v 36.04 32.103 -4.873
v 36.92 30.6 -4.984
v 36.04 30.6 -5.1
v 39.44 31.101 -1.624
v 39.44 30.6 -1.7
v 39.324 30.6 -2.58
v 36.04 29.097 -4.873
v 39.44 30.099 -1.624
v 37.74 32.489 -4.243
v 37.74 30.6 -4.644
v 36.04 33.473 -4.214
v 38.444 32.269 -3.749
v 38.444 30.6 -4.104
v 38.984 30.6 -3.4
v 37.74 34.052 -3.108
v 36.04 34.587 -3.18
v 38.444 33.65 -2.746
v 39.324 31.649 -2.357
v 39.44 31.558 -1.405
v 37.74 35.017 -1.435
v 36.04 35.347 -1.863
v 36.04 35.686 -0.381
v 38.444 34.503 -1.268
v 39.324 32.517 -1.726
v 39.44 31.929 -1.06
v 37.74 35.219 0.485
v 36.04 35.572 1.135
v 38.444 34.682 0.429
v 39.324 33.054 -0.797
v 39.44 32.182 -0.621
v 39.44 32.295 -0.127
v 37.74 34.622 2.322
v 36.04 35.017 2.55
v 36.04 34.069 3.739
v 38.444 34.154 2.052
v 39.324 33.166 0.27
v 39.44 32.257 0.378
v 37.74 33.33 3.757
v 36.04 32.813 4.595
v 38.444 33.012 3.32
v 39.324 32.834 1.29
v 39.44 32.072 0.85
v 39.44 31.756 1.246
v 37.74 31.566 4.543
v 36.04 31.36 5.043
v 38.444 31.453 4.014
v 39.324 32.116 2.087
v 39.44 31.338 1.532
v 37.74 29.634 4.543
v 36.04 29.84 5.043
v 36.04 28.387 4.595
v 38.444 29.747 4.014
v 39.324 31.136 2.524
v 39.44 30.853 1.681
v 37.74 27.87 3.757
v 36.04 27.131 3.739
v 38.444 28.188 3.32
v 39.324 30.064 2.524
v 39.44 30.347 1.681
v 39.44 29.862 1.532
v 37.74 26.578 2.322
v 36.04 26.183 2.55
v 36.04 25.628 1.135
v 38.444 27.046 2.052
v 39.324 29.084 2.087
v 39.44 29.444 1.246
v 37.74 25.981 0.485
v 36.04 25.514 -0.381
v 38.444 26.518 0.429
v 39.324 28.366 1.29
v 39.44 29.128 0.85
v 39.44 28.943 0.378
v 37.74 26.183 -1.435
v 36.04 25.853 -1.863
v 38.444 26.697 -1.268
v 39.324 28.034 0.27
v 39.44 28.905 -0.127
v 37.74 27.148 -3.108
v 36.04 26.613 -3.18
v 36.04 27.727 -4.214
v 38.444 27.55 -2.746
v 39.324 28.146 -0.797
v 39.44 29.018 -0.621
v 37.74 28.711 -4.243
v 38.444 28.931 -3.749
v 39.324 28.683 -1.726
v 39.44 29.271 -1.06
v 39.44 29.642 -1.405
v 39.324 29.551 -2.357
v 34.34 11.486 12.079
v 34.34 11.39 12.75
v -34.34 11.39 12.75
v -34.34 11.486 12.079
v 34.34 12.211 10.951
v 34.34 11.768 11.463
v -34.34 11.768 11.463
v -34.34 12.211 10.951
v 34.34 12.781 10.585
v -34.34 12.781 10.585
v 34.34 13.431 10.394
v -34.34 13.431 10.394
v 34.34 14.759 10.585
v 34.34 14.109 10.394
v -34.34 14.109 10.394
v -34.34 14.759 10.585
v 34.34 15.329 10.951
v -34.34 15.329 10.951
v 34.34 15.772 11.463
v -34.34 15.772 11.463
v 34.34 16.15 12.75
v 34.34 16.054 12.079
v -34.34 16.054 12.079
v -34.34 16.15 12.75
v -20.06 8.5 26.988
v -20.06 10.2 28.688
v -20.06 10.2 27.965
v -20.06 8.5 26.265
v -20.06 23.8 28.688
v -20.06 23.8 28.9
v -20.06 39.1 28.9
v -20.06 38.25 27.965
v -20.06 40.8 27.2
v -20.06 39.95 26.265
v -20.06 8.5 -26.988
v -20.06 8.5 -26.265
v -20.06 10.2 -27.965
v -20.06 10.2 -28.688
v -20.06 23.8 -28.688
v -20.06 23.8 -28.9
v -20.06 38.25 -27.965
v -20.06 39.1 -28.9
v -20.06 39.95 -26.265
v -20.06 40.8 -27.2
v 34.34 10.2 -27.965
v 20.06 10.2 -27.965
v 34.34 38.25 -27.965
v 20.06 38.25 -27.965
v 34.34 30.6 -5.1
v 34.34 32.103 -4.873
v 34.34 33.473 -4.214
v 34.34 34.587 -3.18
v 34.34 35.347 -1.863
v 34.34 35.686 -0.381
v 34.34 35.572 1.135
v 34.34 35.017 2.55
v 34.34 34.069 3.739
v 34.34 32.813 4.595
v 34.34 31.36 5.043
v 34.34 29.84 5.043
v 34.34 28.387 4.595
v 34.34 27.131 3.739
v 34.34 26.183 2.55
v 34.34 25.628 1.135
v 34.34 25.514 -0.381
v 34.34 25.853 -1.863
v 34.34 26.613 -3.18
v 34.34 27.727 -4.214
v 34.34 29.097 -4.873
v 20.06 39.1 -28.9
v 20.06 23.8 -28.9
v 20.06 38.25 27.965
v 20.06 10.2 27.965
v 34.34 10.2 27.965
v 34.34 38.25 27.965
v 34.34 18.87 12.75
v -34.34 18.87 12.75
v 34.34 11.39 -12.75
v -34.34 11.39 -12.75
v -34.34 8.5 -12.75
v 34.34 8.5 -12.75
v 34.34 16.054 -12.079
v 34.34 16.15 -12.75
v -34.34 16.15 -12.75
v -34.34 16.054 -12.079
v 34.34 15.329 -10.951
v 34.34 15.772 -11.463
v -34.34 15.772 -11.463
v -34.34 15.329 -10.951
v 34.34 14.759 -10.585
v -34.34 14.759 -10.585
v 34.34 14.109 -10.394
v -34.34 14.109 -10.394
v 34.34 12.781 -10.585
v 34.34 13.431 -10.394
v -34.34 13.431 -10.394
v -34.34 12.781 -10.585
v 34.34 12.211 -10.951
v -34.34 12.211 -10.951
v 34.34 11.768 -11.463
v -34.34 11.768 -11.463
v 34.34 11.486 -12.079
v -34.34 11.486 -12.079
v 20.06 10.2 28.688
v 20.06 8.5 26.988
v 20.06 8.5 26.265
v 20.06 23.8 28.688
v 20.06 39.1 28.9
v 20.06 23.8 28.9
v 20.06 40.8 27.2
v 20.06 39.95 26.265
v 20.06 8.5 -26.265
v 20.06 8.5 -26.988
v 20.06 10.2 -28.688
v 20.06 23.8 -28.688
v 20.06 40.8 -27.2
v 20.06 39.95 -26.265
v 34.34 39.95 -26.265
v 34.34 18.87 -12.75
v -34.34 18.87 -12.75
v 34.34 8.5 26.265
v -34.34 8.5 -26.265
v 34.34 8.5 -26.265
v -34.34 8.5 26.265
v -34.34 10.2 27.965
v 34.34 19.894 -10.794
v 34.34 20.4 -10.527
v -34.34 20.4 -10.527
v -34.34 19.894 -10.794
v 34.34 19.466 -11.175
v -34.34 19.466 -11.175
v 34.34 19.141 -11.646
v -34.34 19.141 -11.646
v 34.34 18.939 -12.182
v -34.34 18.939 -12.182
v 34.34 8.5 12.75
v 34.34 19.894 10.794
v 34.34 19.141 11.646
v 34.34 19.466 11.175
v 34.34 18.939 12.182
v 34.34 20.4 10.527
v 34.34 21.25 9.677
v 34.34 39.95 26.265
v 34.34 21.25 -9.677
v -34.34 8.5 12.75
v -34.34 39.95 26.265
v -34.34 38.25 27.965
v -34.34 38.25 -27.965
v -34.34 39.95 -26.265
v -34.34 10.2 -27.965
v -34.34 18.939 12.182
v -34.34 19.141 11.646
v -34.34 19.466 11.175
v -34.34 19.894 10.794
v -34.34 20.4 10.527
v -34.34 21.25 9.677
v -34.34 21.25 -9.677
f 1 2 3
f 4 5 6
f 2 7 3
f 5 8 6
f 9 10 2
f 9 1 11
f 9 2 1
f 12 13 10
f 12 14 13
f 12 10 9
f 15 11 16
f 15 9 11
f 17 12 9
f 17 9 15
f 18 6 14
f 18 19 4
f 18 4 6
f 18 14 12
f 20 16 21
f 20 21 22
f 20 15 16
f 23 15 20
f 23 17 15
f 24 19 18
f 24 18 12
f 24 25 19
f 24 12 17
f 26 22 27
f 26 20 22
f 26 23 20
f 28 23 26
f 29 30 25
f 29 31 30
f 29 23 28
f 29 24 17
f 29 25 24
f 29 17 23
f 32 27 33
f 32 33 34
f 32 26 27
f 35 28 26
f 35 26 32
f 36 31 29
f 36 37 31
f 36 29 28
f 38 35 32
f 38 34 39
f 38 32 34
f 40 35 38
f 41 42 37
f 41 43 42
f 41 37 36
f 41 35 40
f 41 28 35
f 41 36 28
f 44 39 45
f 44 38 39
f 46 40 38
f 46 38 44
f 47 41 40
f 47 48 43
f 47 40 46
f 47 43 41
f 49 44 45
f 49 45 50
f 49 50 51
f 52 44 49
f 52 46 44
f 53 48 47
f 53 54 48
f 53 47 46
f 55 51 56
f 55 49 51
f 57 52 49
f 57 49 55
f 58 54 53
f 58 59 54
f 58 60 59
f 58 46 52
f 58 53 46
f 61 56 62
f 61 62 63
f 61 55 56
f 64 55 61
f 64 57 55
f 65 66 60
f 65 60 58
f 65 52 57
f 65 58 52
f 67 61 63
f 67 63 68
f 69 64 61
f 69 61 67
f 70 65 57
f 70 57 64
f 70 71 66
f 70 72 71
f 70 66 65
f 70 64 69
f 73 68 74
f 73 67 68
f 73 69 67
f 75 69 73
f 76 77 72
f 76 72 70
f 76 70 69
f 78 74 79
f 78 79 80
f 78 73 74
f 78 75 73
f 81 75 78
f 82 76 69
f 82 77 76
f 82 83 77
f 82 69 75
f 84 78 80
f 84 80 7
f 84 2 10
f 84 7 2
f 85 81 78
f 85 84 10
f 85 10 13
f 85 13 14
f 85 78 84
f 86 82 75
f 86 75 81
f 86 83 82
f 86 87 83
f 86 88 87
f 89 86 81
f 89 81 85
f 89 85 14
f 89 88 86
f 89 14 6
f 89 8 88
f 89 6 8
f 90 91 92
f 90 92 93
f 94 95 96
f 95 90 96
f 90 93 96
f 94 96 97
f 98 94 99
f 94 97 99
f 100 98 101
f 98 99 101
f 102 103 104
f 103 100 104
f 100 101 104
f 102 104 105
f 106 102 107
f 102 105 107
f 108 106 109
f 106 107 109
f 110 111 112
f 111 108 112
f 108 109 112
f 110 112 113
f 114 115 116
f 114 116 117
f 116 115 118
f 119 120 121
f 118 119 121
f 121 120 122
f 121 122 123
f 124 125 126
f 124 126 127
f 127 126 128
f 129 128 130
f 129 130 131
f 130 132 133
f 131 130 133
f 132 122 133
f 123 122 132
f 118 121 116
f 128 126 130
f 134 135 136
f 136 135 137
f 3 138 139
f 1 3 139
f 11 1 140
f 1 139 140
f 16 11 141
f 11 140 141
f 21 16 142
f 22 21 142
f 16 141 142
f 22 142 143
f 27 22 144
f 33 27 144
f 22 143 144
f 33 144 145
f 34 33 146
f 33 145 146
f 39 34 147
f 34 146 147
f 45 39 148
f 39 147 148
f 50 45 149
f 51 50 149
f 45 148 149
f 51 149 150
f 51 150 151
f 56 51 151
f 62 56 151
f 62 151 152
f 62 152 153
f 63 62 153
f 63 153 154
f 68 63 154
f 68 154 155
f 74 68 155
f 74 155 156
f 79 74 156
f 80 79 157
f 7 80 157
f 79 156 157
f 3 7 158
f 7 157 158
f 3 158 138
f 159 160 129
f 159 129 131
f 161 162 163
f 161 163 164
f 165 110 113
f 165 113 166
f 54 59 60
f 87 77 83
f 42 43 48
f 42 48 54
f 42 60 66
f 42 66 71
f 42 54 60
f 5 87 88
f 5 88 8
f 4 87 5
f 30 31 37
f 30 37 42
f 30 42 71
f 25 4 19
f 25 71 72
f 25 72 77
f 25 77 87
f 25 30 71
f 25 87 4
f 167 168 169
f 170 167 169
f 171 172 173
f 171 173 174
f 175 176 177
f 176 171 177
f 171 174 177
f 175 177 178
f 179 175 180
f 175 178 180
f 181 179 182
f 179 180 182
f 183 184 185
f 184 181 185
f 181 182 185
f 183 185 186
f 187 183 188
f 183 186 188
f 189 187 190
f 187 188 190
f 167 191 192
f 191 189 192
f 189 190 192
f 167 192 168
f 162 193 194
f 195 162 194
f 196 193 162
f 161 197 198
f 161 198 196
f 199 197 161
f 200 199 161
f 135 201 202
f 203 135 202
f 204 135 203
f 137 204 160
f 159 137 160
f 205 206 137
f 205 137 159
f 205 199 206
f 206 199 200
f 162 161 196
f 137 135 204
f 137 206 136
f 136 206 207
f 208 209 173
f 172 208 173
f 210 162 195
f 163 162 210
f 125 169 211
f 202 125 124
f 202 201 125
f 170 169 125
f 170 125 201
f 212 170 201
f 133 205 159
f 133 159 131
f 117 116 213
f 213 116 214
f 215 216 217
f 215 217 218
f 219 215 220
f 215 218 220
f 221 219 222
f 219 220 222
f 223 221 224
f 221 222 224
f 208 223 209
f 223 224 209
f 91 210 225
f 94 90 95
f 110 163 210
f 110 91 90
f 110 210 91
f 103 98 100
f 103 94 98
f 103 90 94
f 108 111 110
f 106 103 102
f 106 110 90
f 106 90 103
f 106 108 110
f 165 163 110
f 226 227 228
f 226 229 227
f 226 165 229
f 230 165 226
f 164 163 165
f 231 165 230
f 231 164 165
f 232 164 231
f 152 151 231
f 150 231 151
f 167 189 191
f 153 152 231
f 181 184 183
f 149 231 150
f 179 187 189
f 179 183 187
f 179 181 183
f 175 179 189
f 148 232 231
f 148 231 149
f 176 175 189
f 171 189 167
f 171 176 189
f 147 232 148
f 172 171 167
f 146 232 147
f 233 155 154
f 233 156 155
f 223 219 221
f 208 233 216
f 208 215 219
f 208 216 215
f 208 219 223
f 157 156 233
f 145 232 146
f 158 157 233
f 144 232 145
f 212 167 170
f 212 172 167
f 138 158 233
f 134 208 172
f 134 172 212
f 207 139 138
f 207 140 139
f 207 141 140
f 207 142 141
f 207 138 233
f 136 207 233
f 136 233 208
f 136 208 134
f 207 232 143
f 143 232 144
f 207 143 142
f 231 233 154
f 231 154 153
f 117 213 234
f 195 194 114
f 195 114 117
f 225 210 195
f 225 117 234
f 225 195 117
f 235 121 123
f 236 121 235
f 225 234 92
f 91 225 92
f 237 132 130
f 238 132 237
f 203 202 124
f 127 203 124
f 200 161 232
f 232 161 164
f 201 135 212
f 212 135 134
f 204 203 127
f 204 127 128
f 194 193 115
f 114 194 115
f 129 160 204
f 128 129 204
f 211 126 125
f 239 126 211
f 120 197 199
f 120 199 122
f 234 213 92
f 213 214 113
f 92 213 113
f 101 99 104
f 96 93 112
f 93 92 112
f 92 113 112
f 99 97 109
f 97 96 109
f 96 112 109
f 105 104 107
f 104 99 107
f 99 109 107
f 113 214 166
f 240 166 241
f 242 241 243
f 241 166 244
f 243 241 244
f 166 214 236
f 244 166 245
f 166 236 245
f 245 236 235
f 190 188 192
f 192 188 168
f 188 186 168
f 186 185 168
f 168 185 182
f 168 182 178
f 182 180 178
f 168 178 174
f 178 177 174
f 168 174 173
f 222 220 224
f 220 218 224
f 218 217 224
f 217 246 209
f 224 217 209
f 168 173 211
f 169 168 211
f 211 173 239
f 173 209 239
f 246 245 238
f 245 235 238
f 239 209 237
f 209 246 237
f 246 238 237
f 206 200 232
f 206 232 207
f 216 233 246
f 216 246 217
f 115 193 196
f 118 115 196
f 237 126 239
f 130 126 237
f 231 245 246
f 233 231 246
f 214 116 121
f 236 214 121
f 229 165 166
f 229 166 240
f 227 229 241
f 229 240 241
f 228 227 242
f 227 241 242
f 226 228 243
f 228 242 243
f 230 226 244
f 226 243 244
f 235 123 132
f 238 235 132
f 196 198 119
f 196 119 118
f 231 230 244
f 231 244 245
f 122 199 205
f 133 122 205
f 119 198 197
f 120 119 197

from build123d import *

# Parameters (mm, degrees)
SKETCH1_W               = 34
SKETCH1_H               = 19
BOSS_EXTRUDE1_DEPTH     = 20.2
SKETCH2_OUTSIDE_W       = 47.224
SKETCH2_OUTSIDE_H       = 32.224
SKETCH2_OUTSIDE_W_2     = 32.9
SKETCH2_OUTSIDE_H_2     = 18.5
CUT_EXTRUDE2_DEPTH      = 44.462627624
CUT_EXTRUDE8_DEPTH      = 36.679686097
CUT_EXTRUDE8_DEPTH_BACK = 36.679686097
SKETCH3_W               = 0.125
SKETCH3_H               = 9
CUT_EXTRUDE3_DEPTH      = 23.6
CHAMFER1_SIZE           = 1
CHAMFER2_SIZE           = 1
CHAMFER3_SIZE           = 1
CHAMFER4_SIZE           = 1
SKETCH10_R              = 3
BOSS_EXTRUDE3_DEPTH     = 3
FILLET1_R               = 2
SCALE_1_SCALE           = 1.7


with BuildPart() as part:
    # Sketch1 → Boss-Extrude1 (new, symmetric)
    with BuildSketch(Plane(origin=(0, 0, 0), x_dir=(0, 0, -1), z_dir=(1, 0, 0))):
        with Locations((0, 14.5)):
            Rectangle(SKETCH1_W, SKETCH1_H)
    extrude(amount=BOSS_EXTRUDE1_DEPTH, both=True)

    # Sketch2 outside → Cut-Extrude2 (cut, through all)
    with BuildSketch(Plane(origin=(11.8, 0, 0), x_dir=(0, 0, -1), z_dir=(1, 0, 0))):
        with Locations((0, 14.5)):
            Rectangle(SKETCH2_OUTSIDE_W, SKETCH2_OUTSIDE_H)
        with Locations((0, 14.25)):
            Rectangle(SKETCH2_OUTSIDE_W_2, SKETCH2_OUTSIDE_H_2, mode=Mode.SUBTRACT)
    cut_extrude2 = extrude(amount=CUT_EXTRUDE2_DEPTH, mode=Mode.SUBTRACT)

    # Mirror1: Cut-Extrude2 across plane
    add(cut_extrude2.mirror(Plane(origin=(0, 0, 0), x_dir=(0, 0, 1), z_dir=(1, 0, 0))), mode=Mode.SUBTRACT)

    # Sketch5 → Cut-Extrude8 (cut, two sides: drawn at the far end of the back side and taken through both)
    with BuildSketch(Plane(origin=(0, 0, 0), x_dir=(0, 0, -1), z_dir=(1, 0, 0)).offset(-CUT_EXTRUDE8_DEPTH_BACK)):
        with BuildLine():
            Line((-5.692330317, 12.5), (5.692330317, 12.5))
            Line((5.692330317, 12.5), (6.192330317, 12))
            ThreePointArc((6.192330317, 12), (6.706274607, 11.346743741), (7.5, 11.1))
            Line((7.5, 11.1), (7.5, 9.5))
            ThreePointArc((7.5, 9.5), (6.1, 8.1), (7.5, 6.7))
            Line((7.5, 6.7), (7.5, 1))
            Line((7.5, 1), (6.5, 0))
            Line((6.5, 0), (-6.5, 0))
            Line((-6.5, 0), (-7.5, 1))
            Line((-7.5, 1), (-7.5, 6.7))
            ThreePointArc((-7.5, 6.7), (-6.1, 8.1), (-7.5, 9.5))
            Line((-7.5, 9.5), (-7.5, 11.1))
            ThreePointArc((-7.5, 11.1), (-6.706274607, 11.346743741), (-6.192330317, 12))
            Line((-6.192330317, 12), (-5.692330317, 12.5))
        make_face()
    extrude(amount=CUT_EXTRUDE8_DEPTH + CUT_EXTRUDE8_DEPTH_BACK, mode=Mode.SUBTRACT)

    # Sketch3 → Cut-Extrude3 (cut)
    with BuildSketch(Plane(origin=(11.8, 0, 0), x_dir=(0, 0, -1), z_dir=(1, 0, 0))):
        with Locations((-16.9375, 9.5)):
            Rectangle(SKETCH3_W, SKETCH3_H)
    cut_extrude3 = extrude(amount=-CUT_EXTRUDE3_DEPTH, mode=Mode.SUBTRACT)

    # Mirror2: Cut-Extrude3 across plane
    add(cut_extrude3.mirror(Plane.XY), mode=Mode.SUBTRACT)

    # Chamfer1
    chamfer1_edges = [part.edges().sort_by_distance(p)[0] for p in [
        (16, 23.5, -16.45),
        (16, 23.5, 16.45),
        (-16, 23.5, 16.45),
        (-16, 23.5, -16.45),
    ]]
    chamfer(chamfer1_edges, length=CHAMFER1_SIZE)

    # Chamfer2
    chamfer2_edges = [part.edges().sort_by_distance(p)[0] for p in [
        (0, 24, 17),
        (0, 24, -17),
    ]]
    chamfer(chamfer2_edges, length=CHAMFER2_SIZE)

    # Chamfer3
    chamfer3_edges = [part.edges().sort_by_distance(p)[0] for p in [
        (16, 5, 16.45),
        (16, 5, -16.45),
        (-16, 5, -16.45),
        (-16, 5, 16.45),
    ]]
    chamfer(chamfer3_edges, length=CHAMFER3_SIZE)

    # Chamfer4
    chamfer4_edges = [part.edges().sort_by_distance(p)[0] for p in [
        (0, 5, 16.875),
        (0, 5, -16.875),
    ]]
    chamfer(chamfer4_edges, length=CHAMFER4_SIZE)

    # Sketch10 → Boss-Extrude3 (add)
    with BuildSketch(Plane(origin=(20.2, 0, 0), x_dir=(0, 0, -1), z_dir=(1, 0, 0))):
        with Locations((0, 18)):
            Circle(SKETCH10_R)
    extrude(amount=BOSS_EXTRUDE3_DEPTH)

    # Fillet1
    fillet1_edges = [part.edges().sort_by_distance(p)[0] for p in [
        (23.2, 18, 3),
    ]]
    fillet(fillet1_edges, radius=FILLET1_R)


with BuildPart() as part_1:
    # Scale 1: scaled about (0, 0, 0)
    add(part.part.scale(SCALE_1_SCALE))


solid = part_1.part
